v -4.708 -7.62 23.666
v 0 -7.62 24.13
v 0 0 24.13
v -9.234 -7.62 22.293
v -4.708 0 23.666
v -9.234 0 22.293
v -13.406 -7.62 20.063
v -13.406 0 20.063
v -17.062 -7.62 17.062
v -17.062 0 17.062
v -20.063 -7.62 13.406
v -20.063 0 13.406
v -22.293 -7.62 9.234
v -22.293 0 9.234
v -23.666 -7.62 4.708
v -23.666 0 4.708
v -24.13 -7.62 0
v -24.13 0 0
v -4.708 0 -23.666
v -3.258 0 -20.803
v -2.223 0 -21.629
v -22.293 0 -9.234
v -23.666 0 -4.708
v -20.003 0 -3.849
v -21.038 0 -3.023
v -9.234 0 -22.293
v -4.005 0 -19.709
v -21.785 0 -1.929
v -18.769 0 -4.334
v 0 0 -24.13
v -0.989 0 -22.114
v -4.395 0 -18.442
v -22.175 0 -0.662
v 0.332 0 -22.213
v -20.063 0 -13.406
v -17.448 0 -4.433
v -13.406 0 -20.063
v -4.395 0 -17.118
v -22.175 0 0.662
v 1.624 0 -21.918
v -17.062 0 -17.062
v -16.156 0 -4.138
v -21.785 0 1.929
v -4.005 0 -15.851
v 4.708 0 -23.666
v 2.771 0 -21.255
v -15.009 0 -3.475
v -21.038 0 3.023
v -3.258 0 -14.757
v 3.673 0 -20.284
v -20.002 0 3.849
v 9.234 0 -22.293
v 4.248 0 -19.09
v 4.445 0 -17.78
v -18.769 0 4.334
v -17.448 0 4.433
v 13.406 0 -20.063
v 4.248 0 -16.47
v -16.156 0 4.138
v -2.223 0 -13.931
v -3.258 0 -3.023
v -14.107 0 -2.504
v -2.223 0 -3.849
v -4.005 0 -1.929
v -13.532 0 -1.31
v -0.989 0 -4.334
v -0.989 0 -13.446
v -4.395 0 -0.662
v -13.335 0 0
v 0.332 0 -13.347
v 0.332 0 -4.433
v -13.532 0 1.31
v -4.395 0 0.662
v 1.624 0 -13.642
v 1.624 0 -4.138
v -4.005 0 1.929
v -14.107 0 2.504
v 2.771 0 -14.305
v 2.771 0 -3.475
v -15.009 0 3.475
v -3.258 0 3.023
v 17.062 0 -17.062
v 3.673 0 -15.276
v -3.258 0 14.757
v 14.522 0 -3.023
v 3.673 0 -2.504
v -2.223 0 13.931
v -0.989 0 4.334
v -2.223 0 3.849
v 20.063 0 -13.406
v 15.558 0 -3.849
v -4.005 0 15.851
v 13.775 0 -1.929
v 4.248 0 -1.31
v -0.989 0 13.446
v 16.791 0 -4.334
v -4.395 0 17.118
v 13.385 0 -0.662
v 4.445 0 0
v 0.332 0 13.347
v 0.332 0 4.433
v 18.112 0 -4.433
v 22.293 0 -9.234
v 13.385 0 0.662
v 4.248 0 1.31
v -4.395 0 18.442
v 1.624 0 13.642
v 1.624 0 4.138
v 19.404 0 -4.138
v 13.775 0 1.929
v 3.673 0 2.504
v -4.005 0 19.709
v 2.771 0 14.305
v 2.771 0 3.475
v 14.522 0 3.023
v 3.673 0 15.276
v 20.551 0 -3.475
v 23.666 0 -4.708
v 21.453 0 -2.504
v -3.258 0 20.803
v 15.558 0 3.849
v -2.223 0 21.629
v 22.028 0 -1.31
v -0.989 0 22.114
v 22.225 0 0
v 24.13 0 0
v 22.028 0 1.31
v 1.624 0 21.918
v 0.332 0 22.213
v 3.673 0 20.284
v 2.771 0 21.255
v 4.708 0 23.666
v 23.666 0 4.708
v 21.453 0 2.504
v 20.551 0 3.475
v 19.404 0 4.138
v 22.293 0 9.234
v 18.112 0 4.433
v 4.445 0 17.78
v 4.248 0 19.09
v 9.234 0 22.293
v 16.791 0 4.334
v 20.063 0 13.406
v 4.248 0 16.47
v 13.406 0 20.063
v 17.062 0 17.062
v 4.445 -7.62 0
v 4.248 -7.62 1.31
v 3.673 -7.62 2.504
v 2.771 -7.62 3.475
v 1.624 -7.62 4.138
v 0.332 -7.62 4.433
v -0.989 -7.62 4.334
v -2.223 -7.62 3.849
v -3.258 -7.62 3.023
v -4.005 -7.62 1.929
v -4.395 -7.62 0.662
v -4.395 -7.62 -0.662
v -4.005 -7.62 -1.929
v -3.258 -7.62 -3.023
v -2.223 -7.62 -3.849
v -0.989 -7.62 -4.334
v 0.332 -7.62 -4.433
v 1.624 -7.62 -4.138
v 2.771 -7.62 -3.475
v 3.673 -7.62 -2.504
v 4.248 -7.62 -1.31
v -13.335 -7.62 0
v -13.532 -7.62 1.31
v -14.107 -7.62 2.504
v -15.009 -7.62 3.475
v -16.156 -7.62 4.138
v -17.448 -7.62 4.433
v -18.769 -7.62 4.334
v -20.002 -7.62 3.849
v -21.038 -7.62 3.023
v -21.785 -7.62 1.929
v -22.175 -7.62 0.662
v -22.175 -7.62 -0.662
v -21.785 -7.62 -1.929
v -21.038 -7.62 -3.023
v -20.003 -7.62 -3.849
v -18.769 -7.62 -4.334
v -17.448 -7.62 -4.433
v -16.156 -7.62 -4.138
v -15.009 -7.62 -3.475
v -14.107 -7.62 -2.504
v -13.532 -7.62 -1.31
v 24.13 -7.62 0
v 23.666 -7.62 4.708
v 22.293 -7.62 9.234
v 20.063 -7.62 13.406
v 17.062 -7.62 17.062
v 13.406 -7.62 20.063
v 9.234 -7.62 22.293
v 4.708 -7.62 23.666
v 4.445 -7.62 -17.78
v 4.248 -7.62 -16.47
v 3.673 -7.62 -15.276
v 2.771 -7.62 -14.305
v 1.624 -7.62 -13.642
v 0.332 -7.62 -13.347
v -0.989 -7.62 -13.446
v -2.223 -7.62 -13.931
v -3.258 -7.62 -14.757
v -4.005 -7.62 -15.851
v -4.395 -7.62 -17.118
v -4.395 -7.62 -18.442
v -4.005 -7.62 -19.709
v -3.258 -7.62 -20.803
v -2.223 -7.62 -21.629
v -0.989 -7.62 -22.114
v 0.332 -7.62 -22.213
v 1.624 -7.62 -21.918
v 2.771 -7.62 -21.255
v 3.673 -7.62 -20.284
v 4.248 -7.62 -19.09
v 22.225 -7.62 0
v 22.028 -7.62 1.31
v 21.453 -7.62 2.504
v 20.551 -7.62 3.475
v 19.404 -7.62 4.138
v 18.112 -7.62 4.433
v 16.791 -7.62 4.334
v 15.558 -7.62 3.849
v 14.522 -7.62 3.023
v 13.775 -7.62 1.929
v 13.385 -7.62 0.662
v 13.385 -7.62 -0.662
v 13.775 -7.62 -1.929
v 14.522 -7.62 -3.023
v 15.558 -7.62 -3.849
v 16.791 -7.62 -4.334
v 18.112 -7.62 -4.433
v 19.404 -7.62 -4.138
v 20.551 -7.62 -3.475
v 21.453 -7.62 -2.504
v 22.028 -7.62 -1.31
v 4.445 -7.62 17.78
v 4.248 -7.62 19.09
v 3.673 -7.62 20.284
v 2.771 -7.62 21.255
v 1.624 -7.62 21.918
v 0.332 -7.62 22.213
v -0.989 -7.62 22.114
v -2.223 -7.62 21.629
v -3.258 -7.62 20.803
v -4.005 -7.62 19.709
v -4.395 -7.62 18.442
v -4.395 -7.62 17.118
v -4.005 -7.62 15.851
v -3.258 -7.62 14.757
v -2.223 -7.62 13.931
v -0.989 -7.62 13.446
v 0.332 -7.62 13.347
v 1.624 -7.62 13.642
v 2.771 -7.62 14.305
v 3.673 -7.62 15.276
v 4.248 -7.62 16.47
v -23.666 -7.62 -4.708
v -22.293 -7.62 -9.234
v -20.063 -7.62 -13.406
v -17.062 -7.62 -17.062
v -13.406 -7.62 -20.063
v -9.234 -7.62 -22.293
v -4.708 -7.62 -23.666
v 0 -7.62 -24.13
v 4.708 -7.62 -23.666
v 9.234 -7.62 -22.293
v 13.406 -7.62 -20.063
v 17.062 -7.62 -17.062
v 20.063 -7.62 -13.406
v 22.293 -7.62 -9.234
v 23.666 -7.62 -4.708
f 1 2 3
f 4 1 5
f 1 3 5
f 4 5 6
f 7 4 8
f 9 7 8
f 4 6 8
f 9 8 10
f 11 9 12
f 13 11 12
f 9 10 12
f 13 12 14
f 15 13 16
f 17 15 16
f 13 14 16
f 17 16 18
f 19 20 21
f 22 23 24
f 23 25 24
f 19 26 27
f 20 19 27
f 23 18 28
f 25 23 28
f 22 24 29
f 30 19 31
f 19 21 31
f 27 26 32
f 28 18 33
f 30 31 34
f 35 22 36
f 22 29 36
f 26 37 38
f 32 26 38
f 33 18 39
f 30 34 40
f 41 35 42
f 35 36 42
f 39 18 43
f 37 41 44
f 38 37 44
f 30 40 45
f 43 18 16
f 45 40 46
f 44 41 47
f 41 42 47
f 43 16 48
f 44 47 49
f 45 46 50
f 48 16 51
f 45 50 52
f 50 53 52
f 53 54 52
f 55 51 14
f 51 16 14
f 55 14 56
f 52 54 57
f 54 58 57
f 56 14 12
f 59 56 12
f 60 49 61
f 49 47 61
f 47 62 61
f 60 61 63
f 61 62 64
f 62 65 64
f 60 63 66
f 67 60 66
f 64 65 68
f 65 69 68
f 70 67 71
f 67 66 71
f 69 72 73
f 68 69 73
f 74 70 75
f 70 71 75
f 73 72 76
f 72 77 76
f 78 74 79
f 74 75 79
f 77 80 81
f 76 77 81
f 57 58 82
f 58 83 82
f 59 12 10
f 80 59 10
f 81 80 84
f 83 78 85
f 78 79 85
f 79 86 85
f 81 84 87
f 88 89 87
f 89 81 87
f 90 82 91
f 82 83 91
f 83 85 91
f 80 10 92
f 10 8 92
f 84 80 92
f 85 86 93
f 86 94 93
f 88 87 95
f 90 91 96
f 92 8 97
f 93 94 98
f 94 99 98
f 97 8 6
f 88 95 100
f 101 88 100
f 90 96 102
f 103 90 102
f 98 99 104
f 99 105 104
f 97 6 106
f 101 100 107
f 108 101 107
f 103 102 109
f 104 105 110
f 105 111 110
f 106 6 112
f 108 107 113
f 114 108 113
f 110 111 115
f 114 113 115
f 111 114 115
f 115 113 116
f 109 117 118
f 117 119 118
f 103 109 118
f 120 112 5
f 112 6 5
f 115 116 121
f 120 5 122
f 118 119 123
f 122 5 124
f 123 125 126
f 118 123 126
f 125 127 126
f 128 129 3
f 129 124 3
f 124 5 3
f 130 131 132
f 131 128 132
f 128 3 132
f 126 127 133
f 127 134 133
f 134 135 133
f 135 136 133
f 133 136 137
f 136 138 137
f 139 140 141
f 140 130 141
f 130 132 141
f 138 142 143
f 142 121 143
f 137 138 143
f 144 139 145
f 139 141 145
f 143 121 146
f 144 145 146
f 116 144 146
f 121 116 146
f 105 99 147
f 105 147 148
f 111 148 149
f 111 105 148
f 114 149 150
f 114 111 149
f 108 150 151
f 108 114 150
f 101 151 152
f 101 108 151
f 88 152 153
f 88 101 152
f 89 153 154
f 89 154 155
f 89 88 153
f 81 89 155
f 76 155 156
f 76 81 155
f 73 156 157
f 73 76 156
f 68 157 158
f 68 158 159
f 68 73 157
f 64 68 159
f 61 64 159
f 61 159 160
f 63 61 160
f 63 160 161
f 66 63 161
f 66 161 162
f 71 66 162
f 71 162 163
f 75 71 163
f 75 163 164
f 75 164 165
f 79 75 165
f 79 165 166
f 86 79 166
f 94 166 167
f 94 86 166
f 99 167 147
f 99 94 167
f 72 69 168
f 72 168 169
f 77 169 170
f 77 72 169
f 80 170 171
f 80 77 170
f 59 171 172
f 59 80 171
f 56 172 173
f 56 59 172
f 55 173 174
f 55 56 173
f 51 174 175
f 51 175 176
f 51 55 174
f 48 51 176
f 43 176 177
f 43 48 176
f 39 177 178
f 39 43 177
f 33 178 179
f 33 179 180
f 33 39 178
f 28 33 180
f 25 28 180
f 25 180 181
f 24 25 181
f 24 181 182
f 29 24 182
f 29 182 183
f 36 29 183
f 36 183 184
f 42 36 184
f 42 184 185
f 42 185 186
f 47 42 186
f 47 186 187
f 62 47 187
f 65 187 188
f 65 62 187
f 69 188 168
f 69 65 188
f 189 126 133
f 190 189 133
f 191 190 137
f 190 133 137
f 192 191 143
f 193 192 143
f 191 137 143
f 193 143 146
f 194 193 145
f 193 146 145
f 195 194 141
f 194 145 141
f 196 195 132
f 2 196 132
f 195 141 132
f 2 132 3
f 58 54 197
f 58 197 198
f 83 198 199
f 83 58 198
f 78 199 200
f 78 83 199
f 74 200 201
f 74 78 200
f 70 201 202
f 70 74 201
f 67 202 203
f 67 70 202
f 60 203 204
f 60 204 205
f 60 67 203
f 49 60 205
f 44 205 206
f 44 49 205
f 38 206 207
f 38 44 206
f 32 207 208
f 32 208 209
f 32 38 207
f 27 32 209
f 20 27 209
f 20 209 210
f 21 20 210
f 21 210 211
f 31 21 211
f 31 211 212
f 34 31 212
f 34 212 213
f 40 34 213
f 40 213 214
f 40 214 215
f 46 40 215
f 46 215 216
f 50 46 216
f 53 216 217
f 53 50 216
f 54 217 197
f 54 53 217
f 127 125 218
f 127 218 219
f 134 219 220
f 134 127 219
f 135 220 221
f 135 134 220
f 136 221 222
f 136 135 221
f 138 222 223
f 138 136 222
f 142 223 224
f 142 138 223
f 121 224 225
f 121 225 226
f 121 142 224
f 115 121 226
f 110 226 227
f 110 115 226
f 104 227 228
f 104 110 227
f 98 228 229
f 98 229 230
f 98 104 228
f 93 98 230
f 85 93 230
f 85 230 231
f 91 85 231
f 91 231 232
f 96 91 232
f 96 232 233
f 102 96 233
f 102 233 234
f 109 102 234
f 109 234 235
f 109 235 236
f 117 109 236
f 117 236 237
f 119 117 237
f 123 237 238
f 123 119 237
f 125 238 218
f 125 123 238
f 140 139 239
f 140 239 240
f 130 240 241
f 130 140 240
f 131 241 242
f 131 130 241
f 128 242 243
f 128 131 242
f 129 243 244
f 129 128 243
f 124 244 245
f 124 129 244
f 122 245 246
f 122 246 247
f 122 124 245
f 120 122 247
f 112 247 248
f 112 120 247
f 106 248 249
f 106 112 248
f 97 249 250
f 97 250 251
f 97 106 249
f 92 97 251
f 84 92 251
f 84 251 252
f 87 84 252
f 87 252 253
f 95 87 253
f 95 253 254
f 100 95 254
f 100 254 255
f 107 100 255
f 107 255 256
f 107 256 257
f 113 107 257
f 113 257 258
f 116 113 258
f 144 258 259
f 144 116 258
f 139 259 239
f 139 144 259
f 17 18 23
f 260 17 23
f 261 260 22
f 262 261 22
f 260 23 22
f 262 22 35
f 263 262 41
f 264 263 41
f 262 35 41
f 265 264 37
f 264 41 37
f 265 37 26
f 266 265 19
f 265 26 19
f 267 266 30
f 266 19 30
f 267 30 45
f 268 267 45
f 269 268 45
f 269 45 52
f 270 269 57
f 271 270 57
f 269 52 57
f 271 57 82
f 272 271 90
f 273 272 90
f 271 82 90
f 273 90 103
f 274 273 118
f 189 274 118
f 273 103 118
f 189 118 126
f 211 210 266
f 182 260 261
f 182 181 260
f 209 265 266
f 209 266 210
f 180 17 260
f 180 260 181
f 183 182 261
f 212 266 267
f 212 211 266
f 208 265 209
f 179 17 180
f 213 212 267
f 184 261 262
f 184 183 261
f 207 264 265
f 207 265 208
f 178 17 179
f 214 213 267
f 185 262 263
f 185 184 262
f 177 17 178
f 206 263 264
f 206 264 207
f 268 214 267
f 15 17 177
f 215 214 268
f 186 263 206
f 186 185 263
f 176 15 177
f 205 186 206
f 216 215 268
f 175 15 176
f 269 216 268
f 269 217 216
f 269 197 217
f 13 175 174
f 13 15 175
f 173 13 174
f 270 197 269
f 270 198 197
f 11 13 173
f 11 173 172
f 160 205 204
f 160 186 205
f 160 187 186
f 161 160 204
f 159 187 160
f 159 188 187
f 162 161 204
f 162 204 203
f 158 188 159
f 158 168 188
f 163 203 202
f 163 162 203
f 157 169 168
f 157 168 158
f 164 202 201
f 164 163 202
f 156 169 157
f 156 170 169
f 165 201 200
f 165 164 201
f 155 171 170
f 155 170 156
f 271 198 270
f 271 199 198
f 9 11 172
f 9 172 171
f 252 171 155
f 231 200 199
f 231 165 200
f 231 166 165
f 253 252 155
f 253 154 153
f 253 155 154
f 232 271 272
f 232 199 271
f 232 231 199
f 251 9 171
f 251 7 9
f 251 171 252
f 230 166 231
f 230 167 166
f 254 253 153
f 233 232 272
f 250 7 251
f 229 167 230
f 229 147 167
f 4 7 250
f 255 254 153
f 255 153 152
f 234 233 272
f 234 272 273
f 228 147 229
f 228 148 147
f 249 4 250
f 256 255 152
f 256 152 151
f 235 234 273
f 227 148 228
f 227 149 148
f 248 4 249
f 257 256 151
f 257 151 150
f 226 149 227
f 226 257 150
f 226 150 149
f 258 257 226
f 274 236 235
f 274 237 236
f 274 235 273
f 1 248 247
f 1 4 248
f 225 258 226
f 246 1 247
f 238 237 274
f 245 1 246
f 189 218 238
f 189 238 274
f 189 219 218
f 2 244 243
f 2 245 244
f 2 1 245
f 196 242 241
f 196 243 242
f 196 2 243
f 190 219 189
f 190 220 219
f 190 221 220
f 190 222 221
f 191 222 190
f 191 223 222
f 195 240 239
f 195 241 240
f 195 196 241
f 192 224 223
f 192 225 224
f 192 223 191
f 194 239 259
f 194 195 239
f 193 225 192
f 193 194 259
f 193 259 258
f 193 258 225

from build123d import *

# Parameters (mm, degrees)
F0_R     = 4.445
F1_DEPTH = 7.62


# Not quite as in the source:
# - a feature names something its author has since deleted; it is built from what else it names


with BuildPart() as f1:
    # F0 (on Front) → F1 (new body)
    with BuildSketch(Plane.XZ):
        with BuildLine():
            Line((6.35, 17.78), (6.35, 6.35))
            Line((6.35, 6.35), (17.78, 6.35))
            ThreePointArc((17.78, 6.35), (22.2701280605, 4.4901280605), (24.13, 0))
            ThreePointArc((24.13, 0), (17.06248663, 17.06248663), (0, 24.13))
            ThreePointArc((0, 24.13), (4.4901280605, 22.2701280605), (6.35, 17.78))
        make_face()
        with BuildLine():
            Line((17.78, -6.35), (6.35, -6.35))
            Line((6.35, -6.35), (6.35, -17.78))
            ThreePointArc((6.35, -17.78), (4.4901280329, -22.2701280882), (-7.83e-08, -24.13))
            ThreePointArc((-7.83e-08, -24.13), (17.0624866024, -17.0624866577), (24.13, 0))
            ThreePointArc((24.13, 0), (22.2701280605, -4.4901280605), (17.78, -6.35))
        make_face()
        with BuildLine():
            Line((-17.78, 6.35), (-6.35, 6.35))
            Line((-6.35, 6.35), (-6.35, 17.78))
            ThreePointArc((-6.35, 17.78), (-4.4901280605, 22.2701280605), (0, 24.13))
            ThreePointArc((0, 24.13), (-17.0624866246, 17.0624866355), (-24.13, 1.54e-08))
            ThreePointArc((-24.13, 1.54e-08), (-22.2701280551, 4.490128066), (-17.78, 6.35))
        make_face()
        with BuildLine():
            Line((-6.35, -17.78), (-6.35, -6.35))
            Line((-6.35, -6.35), (-17.78, -6.35))
            ThreePointArc((-17.78, -6.35), (-22.270128066, -4.4901280551), (-24.13, 1.54e-08))
            ThreePointArc((-24.13, 1.54e-08), (-17.0624866631, -17.0624865969), (-7.83e-08, -24.13))
            ThreePointArc((-7.83e-08, -24.13), (-4.4901280882, -22.2701280329), (-6.35, -17.78))
        make_face()
        with BuildLine():
            ThreePointArc((-6.35, 17.78), (0, 11.43), (6.35, 17.78))
            ThreePointArc((6.35, 17.78), (4.4901280605, 22.2701280605), (0, 24.13))
            ThreePointArc((0, 24.13), (-4.4901280605, 22.2701280605), (-6.35, 17.78))
        make_face()
        with Locations((0, 17.78)):
            Circle(F0_R, mode=Mode.SUBTRACT)
        with BuildLine():
            ThreePointArc((24.13, 0), (22.2701280605, 4.4901280605), (17.78, 6.35))
            ThreePointArc((17.78, 6.35), (11.43, 0), (17.78, -6.35))
            ThreePointArc((17.78, -6.35), (22.2701280605, -4.4901280605), (24.13, 0))
        make_face()
        with Locations((17.78, 0)):
            Circle(F0_R, mode=Mode.SUBTRACT)
        with BuildLine():
            ThreePointArc((-7.83e-08, -24.13), (4.4901280329, -22.2701280882), (6.35, -17.78))
            ThreePointArc((6.35, -17.78), (0, -11.43), (-6.35, -17.78))
            ThreePointArc((-6.35, -17.78), (-4.4901280882, -22.2701280329), (-7.83e-08, -24.13))
        make_face()
        with Locations((0, -17.78)):
            Circle(F0_R, mode=Mode.SUBTRACT)
        with BuildLine():
            ThreePointArc((-11.43, 0), (-13.2898719395, 4.4901280605), (-17.78, 6.35))
            ThreePointArc((-17.78, 6.35), (-22.2701280551, 4.490128066), (-24.13, 1.54e-08))
            ThreePointArc((-24.13, 1.54e-08), (-22.270128066, -4.4901280551), (-17.78, -6.35))
            ThreePointArc((-17.78, -6.35), (-13.2898719395, -4.4901280605), (-11.43, 0))
        make_face()
        with Locations((-17.78, 0)):
            Circle(F0_R, mode=Mode.SUBTRACT)
        with BuildLine():
            ThreePointArc((0, -6.35), (4.4901280605, -4.4901280605), (6.35, 0))
            ThreePointArc((6.35, 0), (4.4901280605, 4.4901280605), (0, 6.35))
            ThreePointArc((0, 6.35), (-4.4901280605, 4.4901280605), (-6.35, 0))
            ThreePointArc((-6.35, 0), (-4.4901280605, -4.4901280605), (0, -6.35))
        make_face()
        Circle(F0_R, mode=Mode.SUBTRACT)
        with BuildLine():
            ThreePointArc((-6.35, 0), (-4.4901280605, 4.4901280605), (0, 6.35))
            Line((0, 6.35), (-6.35, 6.35))
            Line((-6.35, 6.35), (-6.35, 0))
        make_face()
        with BuildLine():
            Line((-6.35, -6.35), (0, -6.35))
            ThreePointArc((0, -6.35), (-4.4901280605, -4.4901280605), (-6.35, 0))
            Line((-6.35, 0), (-6.35, -6.35))
        make_face()
        with BuildLine():
            Line((6.35, -6.35), (6.35, 0))
            ThreePointArc((6.35, 0), (4.4901280605, -4.4901280605), (0, -6.35))
            Line((0, -6.35), (6.35, -6.35))
        make_face()
        with BuildLine():
            ThreePointArc((0, 6.35), (4.4901280605, 4.4901280605), (6.35, 0))
            Line((6.35, 0), (6.35, 6.35))
            Line((6.35, 6.35), (0, 6.35))
        make_face()
        with BuildLine():
            Line((-6.35, -6.35), (-6.35, 0))
            Line((-6.35, 0), (-6.35, 6.35))
            Line((-6.35, 6.35), (-17.78, 6.35))
            ThreePointArc((-17.78, 6.35), (-13.2898719395, 4.4901280605), (-11.43, 0))
            ThreePointArc((-11.43, 0), (-13.2898719395, -4.4901280605), (-17.78, -6.35))
            Line((-17.78, -6.35), (-6.35, -6.35))
        make_face()
        with BuildLine():
            Line((6.35, -6.35), (0, -6.35))
            Line((0, -6.35), (-6.35, -6.35))
            Line((-6.35, -6.35), (-6.35, -17.78))
            ThreePointArc((-6.35, -17.78), (0, -11.43), (6.35, -17.78))
            Line((6.35, -17.78), (6.35, -6.35))
        make_face()
        with BuildLine():
            Line((6.35, 6.35), (6.35, 0))
            Line((6.35, 0), (6.35, -6.35))
            Line((6.35, -6.35), (17.78, -6.35))
            ThreePointArc((17.78, -6.35), (11.43, 0), (17.78, 6.35))
            Line((17.78, 6.35), (6.35, 6.35))
        make_face()
        with BuildLine():
            Line((-6.35, 6.35), (0, 6.35))
            Line((0, 6.35), (6.35, 6.35))
            Line((6.35, 6.35), (6.35, 17.78))
            ThreePointArc((6.35, 17.78), (0, 11.43), (-6.35, 17.78))
            Line((-6.35, 17.78), (-6.35, 6.35))
        make_face()
    extrude(amount=F1_DEPTH)


solid = f1.part
